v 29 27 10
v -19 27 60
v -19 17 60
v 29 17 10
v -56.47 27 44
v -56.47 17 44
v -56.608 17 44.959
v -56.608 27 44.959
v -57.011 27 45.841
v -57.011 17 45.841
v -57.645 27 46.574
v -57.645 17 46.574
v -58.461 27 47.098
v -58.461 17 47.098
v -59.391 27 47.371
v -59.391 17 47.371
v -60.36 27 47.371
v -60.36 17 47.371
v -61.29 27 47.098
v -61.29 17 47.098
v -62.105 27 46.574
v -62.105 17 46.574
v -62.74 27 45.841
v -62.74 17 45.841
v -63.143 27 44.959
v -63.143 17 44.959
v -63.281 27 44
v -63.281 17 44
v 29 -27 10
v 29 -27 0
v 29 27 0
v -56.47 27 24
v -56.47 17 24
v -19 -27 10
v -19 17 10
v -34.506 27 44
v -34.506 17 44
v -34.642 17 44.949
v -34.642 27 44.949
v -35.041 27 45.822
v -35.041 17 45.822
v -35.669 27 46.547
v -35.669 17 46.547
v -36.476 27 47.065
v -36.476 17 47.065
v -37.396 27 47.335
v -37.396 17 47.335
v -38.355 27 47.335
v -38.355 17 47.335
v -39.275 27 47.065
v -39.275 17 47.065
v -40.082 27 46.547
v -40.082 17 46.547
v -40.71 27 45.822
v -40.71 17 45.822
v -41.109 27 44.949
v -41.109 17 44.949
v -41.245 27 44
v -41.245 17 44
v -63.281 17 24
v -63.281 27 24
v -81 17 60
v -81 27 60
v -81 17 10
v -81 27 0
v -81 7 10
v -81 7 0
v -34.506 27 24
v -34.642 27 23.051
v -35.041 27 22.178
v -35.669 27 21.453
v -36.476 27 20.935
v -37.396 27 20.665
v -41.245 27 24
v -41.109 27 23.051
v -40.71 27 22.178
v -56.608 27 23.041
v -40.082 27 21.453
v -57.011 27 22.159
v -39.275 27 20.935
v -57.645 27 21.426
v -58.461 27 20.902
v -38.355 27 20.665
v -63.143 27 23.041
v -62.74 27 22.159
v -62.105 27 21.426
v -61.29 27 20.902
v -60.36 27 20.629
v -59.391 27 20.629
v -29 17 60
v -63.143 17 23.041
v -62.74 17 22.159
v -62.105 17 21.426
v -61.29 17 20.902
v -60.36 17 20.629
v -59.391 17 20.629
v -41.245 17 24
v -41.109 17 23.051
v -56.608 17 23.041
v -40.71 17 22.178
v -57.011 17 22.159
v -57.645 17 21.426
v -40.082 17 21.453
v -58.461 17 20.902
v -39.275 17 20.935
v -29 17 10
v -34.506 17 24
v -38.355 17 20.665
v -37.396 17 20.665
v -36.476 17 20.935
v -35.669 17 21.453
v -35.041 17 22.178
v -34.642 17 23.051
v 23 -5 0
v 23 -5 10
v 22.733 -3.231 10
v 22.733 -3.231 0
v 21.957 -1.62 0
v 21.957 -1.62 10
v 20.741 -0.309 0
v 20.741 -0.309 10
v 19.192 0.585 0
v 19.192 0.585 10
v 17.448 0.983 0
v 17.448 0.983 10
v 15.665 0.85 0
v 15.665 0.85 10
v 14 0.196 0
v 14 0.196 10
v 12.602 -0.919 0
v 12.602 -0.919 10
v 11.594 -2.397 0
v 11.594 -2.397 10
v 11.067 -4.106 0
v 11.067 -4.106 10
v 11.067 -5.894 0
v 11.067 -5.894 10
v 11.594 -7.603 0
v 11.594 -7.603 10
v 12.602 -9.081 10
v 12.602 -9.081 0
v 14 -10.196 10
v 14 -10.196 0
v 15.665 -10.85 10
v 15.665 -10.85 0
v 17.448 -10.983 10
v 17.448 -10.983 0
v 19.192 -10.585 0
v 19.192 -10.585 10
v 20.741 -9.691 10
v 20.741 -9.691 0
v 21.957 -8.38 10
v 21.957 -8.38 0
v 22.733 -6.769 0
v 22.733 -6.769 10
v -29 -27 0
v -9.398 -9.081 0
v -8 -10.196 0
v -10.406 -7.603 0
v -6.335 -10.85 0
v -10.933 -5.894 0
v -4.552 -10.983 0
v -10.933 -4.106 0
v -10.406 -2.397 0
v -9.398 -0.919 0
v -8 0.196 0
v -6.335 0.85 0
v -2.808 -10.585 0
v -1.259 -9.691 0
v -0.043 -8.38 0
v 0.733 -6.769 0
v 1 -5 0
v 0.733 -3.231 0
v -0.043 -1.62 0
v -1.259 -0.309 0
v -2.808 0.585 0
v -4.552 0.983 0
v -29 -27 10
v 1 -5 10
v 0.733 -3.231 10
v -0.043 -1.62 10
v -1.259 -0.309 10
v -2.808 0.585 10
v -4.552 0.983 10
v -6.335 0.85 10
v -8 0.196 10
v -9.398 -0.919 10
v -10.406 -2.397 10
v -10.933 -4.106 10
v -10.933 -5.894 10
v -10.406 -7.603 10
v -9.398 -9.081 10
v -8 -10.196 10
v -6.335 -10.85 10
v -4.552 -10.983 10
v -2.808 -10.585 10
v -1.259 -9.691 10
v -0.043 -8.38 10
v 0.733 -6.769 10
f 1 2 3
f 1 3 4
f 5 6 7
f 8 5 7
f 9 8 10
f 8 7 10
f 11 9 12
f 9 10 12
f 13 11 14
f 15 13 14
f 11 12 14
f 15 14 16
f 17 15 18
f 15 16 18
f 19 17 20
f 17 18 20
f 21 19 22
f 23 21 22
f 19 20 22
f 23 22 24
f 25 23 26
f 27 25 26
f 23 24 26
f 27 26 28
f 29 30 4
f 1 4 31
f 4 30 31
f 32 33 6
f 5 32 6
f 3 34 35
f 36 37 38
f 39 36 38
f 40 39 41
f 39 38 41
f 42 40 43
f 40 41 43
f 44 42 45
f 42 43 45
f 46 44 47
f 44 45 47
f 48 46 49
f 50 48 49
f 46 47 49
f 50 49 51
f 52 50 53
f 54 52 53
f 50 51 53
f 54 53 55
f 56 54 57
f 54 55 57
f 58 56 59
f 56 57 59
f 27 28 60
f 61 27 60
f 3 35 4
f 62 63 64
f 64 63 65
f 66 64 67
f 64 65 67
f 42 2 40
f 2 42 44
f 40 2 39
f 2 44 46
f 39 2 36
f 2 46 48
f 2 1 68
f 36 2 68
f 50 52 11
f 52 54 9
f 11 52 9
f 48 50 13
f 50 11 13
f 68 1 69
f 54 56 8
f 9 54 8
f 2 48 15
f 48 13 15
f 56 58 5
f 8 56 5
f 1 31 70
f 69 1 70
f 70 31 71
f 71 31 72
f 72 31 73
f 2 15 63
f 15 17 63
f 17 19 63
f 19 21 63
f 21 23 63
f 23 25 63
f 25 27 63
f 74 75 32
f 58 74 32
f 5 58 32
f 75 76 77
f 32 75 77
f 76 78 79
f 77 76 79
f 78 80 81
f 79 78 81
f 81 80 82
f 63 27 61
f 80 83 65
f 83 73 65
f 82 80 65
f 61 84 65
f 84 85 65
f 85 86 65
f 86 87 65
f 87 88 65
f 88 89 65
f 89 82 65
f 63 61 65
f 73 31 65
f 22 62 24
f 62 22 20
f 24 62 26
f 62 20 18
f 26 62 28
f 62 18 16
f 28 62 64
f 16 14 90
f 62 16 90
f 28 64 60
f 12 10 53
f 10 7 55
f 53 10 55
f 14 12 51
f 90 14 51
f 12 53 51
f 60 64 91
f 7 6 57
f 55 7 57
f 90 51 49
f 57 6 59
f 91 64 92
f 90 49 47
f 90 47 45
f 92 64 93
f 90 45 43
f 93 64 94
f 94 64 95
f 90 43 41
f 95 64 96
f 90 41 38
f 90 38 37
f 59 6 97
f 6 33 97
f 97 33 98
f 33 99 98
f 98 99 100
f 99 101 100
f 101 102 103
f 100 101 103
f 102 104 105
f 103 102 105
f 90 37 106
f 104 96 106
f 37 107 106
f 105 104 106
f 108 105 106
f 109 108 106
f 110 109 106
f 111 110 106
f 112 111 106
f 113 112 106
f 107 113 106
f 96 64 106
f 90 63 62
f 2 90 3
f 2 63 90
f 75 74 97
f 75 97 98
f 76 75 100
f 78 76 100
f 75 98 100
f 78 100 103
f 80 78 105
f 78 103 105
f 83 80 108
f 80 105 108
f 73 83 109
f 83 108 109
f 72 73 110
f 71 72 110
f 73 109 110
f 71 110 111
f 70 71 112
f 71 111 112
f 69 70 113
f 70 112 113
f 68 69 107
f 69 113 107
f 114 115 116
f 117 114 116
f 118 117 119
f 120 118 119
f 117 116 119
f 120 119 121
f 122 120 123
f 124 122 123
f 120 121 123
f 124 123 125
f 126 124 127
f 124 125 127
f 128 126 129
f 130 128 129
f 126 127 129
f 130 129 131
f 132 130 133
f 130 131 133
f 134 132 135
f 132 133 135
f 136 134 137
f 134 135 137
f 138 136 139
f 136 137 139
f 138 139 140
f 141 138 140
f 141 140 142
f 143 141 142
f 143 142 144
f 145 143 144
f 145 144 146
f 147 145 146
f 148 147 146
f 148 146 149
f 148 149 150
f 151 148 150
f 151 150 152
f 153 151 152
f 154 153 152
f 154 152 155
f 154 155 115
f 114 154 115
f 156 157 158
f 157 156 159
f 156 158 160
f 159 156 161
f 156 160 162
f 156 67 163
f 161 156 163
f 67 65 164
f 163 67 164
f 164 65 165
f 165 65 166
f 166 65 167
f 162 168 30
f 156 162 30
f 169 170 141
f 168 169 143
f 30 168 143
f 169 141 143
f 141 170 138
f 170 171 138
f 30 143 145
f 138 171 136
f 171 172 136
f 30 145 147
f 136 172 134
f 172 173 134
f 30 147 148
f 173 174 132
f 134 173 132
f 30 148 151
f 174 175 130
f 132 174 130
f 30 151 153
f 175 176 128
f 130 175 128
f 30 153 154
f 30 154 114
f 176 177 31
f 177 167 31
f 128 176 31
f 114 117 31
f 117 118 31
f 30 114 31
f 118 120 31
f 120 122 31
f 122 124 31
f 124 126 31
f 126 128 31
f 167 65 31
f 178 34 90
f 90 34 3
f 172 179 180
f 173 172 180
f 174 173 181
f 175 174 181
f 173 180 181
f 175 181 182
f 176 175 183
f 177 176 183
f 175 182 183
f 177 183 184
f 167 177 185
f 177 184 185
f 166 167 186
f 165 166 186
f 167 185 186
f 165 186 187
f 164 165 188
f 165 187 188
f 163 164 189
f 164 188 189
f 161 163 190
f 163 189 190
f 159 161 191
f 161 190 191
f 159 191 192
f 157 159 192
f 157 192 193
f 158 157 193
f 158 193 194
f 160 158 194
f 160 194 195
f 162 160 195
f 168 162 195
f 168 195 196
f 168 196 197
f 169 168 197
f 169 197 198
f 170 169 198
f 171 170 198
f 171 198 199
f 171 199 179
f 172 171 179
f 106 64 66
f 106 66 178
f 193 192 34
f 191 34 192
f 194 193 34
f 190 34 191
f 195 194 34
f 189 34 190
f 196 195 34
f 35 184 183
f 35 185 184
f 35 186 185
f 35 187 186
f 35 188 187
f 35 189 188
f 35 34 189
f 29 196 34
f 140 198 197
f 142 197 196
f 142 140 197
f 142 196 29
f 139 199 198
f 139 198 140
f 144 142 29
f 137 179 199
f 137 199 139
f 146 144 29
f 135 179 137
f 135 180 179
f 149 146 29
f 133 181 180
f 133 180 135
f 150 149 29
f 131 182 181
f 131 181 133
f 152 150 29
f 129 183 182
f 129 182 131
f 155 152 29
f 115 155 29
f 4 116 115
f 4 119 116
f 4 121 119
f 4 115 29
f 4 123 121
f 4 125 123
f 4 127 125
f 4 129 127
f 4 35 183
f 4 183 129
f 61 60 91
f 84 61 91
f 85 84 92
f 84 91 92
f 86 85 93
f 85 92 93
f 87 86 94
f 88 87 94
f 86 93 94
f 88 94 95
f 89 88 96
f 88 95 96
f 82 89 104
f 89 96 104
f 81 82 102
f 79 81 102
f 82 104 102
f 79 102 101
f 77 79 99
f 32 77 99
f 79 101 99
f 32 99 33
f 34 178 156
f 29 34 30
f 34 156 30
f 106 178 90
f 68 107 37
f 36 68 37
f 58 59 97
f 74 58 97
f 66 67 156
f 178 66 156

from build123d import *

# Parameters (mm, degrees)
F0_W      = 58
F0_H      = 54
F1_DEPTH  = 10
F3_DEPTH  = 10
F5_DEPTH  = 50
F4_R      = 6
F4_W      = 10
F4_H      = 44
F7_DEPTH  = 50
F9_DEPTH  = 62.001
F10_DEPTH = 60.001
F11_DEPTH = 10.001


with BuildPart() as f1:
    # F0 (on Top) → F1 (new body)
    with BuildSketch(Plane.XY):
        Rectangle(F0_W, F0_H)
        Polygon((-29, -27), (-29, 27), (-81, 27), (-81, 7), align=None)
    extrude(amount=F1_DEPTH)

    # F2 (on face) → F3 (join)
    with BuildSketch(Plane(origin=(0, 27, 0), x_dir=(-1, 0, 0), z_dir=(0, 1, 0))):
        Polygon((19, 60), (-29, 10), (19, 10), align=None)
    extrude(amount=-F3_DEPTH)

    # F4 (on face) → F5 (join)
    with BuildSketch(Plane.XY.offset(10)):
        Polygon((-81, 27), (-81, 17), (-29, 17), (-19, 17), (-19, 27), align=None)
    extrude(amount=F5_DEPTH)

    # F4 (on face) → F7 (join)
    with BuildSketch(Plane.XY.offset(10)):
        with Locations((17, -5)):
            Circle(F4_R)
        with Locations((-5, -5)):
            Circle(F4_R)
        with Locations((-24, -5)):
            Rectangle(F4_W, F4_H)
    extrude(amount=F7_DEPTH)

    # F8 (on face) → F9 (cut, through all)
    with BuildSketch(Plane.YZ.offset(-19)):
        Polygon((-27, 60), (-27, 10), (17, 60), align=None)
    extrude(amount=-F9_DEPTH, mode=Mode.SUBTRACT)

    # F10 (cut, through all): faces of the model
    f10_faces = [f1.faces().sort_by_distance(p)[0] for p in [
        (-5, -5, 60),
        (17, -5, 60),
    ]]
    extrude(f10_faces, amount=-F10_DEPTH, mode=Mode.SUBTRACT)

    # F6 (on face) → F11 (cut, through all)
    with BuildSketch(Plane.XZ.offset(-17)):
        with BuildLine():
            ThreePointArc((-56.470110421, 44), (-59.8754155453, 47.4053051244), (-63.2807206697, 44))
            Line((-63.2807206697, 44), (-63.2807206697, 24))
            ThreePointArc((-63.2807206697, 24), (-59.8754155453, 20.5946948756), (-56.470110421, 24))
            Line((-56.470110421, 24), (-56.470110421, 44))
        make_face()
        with BuildLine():
            ThreePointArc((-34.5057800598, 44), (-37.8754155453, 47.3696354855), (-41.2450510308, 44))
            Line((-41.2450510308, 44), (-41.2450510308, 24))
            ThreePointArc((-41.2450510308, 24), (-37.8754155453, 20.6303645145), (-34.5057800598, 24))
            Line((-34.5057800598, 24), (-34.5057800598, 44))
        make_face()
    extrude(amount=-F11_DEPTH, mode=Mode.SUBTRACT)


solid = f1.part
